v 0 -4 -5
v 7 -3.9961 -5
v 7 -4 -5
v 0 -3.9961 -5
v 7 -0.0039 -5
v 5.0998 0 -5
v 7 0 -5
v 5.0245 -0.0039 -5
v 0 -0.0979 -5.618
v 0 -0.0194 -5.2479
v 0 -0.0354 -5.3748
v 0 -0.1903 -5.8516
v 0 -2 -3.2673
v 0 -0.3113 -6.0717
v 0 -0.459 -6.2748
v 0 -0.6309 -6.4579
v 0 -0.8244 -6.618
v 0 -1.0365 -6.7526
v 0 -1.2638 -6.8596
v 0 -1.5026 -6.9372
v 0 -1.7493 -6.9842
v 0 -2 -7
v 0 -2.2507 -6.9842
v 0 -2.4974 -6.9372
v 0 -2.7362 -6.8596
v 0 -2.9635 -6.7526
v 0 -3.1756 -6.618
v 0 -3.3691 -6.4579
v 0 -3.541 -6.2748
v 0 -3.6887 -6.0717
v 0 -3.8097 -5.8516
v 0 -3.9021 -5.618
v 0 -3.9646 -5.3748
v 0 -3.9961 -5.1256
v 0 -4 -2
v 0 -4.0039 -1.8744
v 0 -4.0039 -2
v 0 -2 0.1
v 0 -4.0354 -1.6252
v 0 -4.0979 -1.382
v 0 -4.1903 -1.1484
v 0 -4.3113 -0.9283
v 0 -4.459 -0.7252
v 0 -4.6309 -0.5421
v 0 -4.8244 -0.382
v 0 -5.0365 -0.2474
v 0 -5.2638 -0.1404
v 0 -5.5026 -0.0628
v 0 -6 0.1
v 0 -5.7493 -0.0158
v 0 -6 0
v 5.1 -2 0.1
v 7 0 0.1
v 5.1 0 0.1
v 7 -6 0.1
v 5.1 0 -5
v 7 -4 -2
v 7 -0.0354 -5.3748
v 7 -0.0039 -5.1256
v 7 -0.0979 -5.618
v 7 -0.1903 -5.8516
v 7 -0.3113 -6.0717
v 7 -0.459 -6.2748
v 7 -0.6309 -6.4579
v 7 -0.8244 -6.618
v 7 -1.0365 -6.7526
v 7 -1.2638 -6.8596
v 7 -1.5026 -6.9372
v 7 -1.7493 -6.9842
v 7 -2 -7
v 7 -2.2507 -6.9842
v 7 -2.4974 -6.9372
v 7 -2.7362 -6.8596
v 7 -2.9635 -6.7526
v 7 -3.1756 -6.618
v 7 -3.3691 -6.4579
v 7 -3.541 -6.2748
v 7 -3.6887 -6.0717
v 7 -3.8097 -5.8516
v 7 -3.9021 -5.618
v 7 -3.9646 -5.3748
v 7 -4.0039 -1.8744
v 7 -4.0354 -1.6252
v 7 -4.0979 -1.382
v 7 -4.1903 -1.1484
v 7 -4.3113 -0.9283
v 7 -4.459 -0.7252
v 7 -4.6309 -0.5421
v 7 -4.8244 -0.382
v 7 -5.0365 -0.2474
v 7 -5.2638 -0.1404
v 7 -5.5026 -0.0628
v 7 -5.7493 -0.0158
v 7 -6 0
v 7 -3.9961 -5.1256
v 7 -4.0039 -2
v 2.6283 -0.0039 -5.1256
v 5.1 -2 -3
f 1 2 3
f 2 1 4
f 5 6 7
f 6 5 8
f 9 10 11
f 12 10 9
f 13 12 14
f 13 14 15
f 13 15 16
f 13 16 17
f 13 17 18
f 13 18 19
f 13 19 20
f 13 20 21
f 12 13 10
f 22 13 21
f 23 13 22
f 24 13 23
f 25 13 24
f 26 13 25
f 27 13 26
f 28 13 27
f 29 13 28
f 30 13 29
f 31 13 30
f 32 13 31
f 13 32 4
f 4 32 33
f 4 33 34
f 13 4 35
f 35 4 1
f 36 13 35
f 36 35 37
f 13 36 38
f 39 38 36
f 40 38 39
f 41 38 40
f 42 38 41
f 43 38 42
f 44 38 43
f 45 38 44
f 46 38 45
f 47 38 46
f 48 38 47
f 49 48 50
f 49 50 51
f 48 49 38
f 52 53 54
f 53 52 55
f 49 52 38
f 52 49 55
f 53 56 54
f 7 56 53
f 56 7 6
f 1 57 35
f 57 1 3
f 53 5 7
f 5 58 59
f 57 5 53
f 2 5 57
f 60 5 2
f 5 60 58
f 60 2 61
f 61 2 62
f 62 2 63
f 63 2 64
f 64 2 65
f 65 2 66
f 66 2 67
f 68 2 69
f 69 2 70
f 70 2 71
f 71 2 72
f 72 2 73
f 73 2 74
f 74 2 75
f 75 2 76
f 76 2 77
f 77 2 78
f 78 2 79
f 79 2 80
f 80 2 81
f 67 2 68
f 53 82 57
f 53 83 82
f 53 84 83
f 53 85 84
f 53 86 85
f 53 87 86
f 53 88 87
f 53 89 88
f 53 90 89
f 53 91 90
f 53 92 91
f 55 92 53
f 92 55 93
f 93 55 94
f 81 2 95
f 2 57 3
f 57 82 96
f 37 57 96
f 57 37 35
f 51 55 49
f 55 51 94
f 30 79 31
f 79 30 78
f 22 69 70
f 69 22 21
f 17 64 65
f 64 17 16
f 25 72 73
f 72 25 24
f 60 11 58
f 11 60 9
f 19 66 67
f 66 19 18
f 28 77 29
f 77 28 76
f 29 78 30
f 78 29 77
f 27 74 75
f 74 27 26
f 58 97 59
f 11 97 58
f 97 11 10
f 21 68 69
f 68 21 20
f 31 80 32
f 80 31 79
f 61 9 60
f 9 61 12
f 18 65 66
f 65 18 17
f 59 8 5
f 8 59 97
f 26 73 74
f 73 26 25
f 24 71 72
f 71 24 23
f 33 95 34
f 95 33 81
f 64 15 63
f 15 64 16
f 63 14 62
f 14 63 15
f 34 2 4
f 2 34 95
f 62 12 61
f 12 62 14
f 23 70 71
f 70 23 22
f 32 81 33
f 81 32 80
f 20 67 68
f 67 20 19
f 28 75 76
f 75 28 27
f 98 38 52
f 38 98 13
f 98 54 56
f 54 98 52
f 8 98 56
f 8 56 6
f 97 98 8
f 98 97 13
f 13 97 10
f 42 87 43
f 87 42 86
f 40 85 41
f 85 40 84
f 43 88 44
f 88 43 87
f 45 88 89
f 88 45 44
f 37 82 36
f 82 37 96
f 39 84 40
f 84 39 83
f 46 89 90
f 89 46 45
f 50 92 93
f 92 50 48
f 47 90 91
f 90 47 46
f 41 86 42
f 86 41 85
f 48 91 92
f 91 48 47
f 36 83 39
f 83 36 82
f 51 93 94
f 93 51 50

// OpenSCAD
$fn = 50;
x = 0.1;
e = 0.001;

module lock_shape(y1, y2, z1, z2) {
	linear_extrude(height = e)
		polygon([[0, 0], [0, y1 + y2], [z1, y1 + y2], [z2, y1], [z2, 0]]);
}

module lock(length, width, height, angle) {
	y1 = x;
	y2 = width;
	z1 = height - width;
	z2 = height;
	zo = length * tan(angle);

	translate([length, y1, 0]) rotate([0, 90, 180]) hull() {
		lock_shape(y1, y2, z1, z2);
		translate([0, 0, length])
			lock_shape(y1, y2, z1 + zo, z2 + zo);
	}
}

module lock_post(length, width, height, angle, wall = 2, stopper_length = 2) {
	w = width + wall;
	difference() {
		union() {
			translate([0, 0, x]) rotate([0, 180, 180]) cube([length + stopper_length, w, height + x]);
			translate([0, 0, x]) rotate([0, 180, 180]) cube([length + stopper_length, w + wall, wall + x]);
			translate([0, -w / 2, -height]) rotate([0, 90, 0]) cylinder(r = w / 2, h = length + stopper_length);
		}
		translate([-x, 0, 2*x]) lock(length = length + 2 * x, width = width, height = height + 2 * x, angle = angle);
		translate([-1, -w - wall, -wall]) rotate([0, 90, 0]) cylinder(r = wall, h = length + stopper_length + 2);
	}
}

translate([0, 2, 0]) lock(length = 5, width = 2, height = 5, angle = 3);
!lock_post(length = 5, width = 2, height = 5, angle = 3, wall = 2);
